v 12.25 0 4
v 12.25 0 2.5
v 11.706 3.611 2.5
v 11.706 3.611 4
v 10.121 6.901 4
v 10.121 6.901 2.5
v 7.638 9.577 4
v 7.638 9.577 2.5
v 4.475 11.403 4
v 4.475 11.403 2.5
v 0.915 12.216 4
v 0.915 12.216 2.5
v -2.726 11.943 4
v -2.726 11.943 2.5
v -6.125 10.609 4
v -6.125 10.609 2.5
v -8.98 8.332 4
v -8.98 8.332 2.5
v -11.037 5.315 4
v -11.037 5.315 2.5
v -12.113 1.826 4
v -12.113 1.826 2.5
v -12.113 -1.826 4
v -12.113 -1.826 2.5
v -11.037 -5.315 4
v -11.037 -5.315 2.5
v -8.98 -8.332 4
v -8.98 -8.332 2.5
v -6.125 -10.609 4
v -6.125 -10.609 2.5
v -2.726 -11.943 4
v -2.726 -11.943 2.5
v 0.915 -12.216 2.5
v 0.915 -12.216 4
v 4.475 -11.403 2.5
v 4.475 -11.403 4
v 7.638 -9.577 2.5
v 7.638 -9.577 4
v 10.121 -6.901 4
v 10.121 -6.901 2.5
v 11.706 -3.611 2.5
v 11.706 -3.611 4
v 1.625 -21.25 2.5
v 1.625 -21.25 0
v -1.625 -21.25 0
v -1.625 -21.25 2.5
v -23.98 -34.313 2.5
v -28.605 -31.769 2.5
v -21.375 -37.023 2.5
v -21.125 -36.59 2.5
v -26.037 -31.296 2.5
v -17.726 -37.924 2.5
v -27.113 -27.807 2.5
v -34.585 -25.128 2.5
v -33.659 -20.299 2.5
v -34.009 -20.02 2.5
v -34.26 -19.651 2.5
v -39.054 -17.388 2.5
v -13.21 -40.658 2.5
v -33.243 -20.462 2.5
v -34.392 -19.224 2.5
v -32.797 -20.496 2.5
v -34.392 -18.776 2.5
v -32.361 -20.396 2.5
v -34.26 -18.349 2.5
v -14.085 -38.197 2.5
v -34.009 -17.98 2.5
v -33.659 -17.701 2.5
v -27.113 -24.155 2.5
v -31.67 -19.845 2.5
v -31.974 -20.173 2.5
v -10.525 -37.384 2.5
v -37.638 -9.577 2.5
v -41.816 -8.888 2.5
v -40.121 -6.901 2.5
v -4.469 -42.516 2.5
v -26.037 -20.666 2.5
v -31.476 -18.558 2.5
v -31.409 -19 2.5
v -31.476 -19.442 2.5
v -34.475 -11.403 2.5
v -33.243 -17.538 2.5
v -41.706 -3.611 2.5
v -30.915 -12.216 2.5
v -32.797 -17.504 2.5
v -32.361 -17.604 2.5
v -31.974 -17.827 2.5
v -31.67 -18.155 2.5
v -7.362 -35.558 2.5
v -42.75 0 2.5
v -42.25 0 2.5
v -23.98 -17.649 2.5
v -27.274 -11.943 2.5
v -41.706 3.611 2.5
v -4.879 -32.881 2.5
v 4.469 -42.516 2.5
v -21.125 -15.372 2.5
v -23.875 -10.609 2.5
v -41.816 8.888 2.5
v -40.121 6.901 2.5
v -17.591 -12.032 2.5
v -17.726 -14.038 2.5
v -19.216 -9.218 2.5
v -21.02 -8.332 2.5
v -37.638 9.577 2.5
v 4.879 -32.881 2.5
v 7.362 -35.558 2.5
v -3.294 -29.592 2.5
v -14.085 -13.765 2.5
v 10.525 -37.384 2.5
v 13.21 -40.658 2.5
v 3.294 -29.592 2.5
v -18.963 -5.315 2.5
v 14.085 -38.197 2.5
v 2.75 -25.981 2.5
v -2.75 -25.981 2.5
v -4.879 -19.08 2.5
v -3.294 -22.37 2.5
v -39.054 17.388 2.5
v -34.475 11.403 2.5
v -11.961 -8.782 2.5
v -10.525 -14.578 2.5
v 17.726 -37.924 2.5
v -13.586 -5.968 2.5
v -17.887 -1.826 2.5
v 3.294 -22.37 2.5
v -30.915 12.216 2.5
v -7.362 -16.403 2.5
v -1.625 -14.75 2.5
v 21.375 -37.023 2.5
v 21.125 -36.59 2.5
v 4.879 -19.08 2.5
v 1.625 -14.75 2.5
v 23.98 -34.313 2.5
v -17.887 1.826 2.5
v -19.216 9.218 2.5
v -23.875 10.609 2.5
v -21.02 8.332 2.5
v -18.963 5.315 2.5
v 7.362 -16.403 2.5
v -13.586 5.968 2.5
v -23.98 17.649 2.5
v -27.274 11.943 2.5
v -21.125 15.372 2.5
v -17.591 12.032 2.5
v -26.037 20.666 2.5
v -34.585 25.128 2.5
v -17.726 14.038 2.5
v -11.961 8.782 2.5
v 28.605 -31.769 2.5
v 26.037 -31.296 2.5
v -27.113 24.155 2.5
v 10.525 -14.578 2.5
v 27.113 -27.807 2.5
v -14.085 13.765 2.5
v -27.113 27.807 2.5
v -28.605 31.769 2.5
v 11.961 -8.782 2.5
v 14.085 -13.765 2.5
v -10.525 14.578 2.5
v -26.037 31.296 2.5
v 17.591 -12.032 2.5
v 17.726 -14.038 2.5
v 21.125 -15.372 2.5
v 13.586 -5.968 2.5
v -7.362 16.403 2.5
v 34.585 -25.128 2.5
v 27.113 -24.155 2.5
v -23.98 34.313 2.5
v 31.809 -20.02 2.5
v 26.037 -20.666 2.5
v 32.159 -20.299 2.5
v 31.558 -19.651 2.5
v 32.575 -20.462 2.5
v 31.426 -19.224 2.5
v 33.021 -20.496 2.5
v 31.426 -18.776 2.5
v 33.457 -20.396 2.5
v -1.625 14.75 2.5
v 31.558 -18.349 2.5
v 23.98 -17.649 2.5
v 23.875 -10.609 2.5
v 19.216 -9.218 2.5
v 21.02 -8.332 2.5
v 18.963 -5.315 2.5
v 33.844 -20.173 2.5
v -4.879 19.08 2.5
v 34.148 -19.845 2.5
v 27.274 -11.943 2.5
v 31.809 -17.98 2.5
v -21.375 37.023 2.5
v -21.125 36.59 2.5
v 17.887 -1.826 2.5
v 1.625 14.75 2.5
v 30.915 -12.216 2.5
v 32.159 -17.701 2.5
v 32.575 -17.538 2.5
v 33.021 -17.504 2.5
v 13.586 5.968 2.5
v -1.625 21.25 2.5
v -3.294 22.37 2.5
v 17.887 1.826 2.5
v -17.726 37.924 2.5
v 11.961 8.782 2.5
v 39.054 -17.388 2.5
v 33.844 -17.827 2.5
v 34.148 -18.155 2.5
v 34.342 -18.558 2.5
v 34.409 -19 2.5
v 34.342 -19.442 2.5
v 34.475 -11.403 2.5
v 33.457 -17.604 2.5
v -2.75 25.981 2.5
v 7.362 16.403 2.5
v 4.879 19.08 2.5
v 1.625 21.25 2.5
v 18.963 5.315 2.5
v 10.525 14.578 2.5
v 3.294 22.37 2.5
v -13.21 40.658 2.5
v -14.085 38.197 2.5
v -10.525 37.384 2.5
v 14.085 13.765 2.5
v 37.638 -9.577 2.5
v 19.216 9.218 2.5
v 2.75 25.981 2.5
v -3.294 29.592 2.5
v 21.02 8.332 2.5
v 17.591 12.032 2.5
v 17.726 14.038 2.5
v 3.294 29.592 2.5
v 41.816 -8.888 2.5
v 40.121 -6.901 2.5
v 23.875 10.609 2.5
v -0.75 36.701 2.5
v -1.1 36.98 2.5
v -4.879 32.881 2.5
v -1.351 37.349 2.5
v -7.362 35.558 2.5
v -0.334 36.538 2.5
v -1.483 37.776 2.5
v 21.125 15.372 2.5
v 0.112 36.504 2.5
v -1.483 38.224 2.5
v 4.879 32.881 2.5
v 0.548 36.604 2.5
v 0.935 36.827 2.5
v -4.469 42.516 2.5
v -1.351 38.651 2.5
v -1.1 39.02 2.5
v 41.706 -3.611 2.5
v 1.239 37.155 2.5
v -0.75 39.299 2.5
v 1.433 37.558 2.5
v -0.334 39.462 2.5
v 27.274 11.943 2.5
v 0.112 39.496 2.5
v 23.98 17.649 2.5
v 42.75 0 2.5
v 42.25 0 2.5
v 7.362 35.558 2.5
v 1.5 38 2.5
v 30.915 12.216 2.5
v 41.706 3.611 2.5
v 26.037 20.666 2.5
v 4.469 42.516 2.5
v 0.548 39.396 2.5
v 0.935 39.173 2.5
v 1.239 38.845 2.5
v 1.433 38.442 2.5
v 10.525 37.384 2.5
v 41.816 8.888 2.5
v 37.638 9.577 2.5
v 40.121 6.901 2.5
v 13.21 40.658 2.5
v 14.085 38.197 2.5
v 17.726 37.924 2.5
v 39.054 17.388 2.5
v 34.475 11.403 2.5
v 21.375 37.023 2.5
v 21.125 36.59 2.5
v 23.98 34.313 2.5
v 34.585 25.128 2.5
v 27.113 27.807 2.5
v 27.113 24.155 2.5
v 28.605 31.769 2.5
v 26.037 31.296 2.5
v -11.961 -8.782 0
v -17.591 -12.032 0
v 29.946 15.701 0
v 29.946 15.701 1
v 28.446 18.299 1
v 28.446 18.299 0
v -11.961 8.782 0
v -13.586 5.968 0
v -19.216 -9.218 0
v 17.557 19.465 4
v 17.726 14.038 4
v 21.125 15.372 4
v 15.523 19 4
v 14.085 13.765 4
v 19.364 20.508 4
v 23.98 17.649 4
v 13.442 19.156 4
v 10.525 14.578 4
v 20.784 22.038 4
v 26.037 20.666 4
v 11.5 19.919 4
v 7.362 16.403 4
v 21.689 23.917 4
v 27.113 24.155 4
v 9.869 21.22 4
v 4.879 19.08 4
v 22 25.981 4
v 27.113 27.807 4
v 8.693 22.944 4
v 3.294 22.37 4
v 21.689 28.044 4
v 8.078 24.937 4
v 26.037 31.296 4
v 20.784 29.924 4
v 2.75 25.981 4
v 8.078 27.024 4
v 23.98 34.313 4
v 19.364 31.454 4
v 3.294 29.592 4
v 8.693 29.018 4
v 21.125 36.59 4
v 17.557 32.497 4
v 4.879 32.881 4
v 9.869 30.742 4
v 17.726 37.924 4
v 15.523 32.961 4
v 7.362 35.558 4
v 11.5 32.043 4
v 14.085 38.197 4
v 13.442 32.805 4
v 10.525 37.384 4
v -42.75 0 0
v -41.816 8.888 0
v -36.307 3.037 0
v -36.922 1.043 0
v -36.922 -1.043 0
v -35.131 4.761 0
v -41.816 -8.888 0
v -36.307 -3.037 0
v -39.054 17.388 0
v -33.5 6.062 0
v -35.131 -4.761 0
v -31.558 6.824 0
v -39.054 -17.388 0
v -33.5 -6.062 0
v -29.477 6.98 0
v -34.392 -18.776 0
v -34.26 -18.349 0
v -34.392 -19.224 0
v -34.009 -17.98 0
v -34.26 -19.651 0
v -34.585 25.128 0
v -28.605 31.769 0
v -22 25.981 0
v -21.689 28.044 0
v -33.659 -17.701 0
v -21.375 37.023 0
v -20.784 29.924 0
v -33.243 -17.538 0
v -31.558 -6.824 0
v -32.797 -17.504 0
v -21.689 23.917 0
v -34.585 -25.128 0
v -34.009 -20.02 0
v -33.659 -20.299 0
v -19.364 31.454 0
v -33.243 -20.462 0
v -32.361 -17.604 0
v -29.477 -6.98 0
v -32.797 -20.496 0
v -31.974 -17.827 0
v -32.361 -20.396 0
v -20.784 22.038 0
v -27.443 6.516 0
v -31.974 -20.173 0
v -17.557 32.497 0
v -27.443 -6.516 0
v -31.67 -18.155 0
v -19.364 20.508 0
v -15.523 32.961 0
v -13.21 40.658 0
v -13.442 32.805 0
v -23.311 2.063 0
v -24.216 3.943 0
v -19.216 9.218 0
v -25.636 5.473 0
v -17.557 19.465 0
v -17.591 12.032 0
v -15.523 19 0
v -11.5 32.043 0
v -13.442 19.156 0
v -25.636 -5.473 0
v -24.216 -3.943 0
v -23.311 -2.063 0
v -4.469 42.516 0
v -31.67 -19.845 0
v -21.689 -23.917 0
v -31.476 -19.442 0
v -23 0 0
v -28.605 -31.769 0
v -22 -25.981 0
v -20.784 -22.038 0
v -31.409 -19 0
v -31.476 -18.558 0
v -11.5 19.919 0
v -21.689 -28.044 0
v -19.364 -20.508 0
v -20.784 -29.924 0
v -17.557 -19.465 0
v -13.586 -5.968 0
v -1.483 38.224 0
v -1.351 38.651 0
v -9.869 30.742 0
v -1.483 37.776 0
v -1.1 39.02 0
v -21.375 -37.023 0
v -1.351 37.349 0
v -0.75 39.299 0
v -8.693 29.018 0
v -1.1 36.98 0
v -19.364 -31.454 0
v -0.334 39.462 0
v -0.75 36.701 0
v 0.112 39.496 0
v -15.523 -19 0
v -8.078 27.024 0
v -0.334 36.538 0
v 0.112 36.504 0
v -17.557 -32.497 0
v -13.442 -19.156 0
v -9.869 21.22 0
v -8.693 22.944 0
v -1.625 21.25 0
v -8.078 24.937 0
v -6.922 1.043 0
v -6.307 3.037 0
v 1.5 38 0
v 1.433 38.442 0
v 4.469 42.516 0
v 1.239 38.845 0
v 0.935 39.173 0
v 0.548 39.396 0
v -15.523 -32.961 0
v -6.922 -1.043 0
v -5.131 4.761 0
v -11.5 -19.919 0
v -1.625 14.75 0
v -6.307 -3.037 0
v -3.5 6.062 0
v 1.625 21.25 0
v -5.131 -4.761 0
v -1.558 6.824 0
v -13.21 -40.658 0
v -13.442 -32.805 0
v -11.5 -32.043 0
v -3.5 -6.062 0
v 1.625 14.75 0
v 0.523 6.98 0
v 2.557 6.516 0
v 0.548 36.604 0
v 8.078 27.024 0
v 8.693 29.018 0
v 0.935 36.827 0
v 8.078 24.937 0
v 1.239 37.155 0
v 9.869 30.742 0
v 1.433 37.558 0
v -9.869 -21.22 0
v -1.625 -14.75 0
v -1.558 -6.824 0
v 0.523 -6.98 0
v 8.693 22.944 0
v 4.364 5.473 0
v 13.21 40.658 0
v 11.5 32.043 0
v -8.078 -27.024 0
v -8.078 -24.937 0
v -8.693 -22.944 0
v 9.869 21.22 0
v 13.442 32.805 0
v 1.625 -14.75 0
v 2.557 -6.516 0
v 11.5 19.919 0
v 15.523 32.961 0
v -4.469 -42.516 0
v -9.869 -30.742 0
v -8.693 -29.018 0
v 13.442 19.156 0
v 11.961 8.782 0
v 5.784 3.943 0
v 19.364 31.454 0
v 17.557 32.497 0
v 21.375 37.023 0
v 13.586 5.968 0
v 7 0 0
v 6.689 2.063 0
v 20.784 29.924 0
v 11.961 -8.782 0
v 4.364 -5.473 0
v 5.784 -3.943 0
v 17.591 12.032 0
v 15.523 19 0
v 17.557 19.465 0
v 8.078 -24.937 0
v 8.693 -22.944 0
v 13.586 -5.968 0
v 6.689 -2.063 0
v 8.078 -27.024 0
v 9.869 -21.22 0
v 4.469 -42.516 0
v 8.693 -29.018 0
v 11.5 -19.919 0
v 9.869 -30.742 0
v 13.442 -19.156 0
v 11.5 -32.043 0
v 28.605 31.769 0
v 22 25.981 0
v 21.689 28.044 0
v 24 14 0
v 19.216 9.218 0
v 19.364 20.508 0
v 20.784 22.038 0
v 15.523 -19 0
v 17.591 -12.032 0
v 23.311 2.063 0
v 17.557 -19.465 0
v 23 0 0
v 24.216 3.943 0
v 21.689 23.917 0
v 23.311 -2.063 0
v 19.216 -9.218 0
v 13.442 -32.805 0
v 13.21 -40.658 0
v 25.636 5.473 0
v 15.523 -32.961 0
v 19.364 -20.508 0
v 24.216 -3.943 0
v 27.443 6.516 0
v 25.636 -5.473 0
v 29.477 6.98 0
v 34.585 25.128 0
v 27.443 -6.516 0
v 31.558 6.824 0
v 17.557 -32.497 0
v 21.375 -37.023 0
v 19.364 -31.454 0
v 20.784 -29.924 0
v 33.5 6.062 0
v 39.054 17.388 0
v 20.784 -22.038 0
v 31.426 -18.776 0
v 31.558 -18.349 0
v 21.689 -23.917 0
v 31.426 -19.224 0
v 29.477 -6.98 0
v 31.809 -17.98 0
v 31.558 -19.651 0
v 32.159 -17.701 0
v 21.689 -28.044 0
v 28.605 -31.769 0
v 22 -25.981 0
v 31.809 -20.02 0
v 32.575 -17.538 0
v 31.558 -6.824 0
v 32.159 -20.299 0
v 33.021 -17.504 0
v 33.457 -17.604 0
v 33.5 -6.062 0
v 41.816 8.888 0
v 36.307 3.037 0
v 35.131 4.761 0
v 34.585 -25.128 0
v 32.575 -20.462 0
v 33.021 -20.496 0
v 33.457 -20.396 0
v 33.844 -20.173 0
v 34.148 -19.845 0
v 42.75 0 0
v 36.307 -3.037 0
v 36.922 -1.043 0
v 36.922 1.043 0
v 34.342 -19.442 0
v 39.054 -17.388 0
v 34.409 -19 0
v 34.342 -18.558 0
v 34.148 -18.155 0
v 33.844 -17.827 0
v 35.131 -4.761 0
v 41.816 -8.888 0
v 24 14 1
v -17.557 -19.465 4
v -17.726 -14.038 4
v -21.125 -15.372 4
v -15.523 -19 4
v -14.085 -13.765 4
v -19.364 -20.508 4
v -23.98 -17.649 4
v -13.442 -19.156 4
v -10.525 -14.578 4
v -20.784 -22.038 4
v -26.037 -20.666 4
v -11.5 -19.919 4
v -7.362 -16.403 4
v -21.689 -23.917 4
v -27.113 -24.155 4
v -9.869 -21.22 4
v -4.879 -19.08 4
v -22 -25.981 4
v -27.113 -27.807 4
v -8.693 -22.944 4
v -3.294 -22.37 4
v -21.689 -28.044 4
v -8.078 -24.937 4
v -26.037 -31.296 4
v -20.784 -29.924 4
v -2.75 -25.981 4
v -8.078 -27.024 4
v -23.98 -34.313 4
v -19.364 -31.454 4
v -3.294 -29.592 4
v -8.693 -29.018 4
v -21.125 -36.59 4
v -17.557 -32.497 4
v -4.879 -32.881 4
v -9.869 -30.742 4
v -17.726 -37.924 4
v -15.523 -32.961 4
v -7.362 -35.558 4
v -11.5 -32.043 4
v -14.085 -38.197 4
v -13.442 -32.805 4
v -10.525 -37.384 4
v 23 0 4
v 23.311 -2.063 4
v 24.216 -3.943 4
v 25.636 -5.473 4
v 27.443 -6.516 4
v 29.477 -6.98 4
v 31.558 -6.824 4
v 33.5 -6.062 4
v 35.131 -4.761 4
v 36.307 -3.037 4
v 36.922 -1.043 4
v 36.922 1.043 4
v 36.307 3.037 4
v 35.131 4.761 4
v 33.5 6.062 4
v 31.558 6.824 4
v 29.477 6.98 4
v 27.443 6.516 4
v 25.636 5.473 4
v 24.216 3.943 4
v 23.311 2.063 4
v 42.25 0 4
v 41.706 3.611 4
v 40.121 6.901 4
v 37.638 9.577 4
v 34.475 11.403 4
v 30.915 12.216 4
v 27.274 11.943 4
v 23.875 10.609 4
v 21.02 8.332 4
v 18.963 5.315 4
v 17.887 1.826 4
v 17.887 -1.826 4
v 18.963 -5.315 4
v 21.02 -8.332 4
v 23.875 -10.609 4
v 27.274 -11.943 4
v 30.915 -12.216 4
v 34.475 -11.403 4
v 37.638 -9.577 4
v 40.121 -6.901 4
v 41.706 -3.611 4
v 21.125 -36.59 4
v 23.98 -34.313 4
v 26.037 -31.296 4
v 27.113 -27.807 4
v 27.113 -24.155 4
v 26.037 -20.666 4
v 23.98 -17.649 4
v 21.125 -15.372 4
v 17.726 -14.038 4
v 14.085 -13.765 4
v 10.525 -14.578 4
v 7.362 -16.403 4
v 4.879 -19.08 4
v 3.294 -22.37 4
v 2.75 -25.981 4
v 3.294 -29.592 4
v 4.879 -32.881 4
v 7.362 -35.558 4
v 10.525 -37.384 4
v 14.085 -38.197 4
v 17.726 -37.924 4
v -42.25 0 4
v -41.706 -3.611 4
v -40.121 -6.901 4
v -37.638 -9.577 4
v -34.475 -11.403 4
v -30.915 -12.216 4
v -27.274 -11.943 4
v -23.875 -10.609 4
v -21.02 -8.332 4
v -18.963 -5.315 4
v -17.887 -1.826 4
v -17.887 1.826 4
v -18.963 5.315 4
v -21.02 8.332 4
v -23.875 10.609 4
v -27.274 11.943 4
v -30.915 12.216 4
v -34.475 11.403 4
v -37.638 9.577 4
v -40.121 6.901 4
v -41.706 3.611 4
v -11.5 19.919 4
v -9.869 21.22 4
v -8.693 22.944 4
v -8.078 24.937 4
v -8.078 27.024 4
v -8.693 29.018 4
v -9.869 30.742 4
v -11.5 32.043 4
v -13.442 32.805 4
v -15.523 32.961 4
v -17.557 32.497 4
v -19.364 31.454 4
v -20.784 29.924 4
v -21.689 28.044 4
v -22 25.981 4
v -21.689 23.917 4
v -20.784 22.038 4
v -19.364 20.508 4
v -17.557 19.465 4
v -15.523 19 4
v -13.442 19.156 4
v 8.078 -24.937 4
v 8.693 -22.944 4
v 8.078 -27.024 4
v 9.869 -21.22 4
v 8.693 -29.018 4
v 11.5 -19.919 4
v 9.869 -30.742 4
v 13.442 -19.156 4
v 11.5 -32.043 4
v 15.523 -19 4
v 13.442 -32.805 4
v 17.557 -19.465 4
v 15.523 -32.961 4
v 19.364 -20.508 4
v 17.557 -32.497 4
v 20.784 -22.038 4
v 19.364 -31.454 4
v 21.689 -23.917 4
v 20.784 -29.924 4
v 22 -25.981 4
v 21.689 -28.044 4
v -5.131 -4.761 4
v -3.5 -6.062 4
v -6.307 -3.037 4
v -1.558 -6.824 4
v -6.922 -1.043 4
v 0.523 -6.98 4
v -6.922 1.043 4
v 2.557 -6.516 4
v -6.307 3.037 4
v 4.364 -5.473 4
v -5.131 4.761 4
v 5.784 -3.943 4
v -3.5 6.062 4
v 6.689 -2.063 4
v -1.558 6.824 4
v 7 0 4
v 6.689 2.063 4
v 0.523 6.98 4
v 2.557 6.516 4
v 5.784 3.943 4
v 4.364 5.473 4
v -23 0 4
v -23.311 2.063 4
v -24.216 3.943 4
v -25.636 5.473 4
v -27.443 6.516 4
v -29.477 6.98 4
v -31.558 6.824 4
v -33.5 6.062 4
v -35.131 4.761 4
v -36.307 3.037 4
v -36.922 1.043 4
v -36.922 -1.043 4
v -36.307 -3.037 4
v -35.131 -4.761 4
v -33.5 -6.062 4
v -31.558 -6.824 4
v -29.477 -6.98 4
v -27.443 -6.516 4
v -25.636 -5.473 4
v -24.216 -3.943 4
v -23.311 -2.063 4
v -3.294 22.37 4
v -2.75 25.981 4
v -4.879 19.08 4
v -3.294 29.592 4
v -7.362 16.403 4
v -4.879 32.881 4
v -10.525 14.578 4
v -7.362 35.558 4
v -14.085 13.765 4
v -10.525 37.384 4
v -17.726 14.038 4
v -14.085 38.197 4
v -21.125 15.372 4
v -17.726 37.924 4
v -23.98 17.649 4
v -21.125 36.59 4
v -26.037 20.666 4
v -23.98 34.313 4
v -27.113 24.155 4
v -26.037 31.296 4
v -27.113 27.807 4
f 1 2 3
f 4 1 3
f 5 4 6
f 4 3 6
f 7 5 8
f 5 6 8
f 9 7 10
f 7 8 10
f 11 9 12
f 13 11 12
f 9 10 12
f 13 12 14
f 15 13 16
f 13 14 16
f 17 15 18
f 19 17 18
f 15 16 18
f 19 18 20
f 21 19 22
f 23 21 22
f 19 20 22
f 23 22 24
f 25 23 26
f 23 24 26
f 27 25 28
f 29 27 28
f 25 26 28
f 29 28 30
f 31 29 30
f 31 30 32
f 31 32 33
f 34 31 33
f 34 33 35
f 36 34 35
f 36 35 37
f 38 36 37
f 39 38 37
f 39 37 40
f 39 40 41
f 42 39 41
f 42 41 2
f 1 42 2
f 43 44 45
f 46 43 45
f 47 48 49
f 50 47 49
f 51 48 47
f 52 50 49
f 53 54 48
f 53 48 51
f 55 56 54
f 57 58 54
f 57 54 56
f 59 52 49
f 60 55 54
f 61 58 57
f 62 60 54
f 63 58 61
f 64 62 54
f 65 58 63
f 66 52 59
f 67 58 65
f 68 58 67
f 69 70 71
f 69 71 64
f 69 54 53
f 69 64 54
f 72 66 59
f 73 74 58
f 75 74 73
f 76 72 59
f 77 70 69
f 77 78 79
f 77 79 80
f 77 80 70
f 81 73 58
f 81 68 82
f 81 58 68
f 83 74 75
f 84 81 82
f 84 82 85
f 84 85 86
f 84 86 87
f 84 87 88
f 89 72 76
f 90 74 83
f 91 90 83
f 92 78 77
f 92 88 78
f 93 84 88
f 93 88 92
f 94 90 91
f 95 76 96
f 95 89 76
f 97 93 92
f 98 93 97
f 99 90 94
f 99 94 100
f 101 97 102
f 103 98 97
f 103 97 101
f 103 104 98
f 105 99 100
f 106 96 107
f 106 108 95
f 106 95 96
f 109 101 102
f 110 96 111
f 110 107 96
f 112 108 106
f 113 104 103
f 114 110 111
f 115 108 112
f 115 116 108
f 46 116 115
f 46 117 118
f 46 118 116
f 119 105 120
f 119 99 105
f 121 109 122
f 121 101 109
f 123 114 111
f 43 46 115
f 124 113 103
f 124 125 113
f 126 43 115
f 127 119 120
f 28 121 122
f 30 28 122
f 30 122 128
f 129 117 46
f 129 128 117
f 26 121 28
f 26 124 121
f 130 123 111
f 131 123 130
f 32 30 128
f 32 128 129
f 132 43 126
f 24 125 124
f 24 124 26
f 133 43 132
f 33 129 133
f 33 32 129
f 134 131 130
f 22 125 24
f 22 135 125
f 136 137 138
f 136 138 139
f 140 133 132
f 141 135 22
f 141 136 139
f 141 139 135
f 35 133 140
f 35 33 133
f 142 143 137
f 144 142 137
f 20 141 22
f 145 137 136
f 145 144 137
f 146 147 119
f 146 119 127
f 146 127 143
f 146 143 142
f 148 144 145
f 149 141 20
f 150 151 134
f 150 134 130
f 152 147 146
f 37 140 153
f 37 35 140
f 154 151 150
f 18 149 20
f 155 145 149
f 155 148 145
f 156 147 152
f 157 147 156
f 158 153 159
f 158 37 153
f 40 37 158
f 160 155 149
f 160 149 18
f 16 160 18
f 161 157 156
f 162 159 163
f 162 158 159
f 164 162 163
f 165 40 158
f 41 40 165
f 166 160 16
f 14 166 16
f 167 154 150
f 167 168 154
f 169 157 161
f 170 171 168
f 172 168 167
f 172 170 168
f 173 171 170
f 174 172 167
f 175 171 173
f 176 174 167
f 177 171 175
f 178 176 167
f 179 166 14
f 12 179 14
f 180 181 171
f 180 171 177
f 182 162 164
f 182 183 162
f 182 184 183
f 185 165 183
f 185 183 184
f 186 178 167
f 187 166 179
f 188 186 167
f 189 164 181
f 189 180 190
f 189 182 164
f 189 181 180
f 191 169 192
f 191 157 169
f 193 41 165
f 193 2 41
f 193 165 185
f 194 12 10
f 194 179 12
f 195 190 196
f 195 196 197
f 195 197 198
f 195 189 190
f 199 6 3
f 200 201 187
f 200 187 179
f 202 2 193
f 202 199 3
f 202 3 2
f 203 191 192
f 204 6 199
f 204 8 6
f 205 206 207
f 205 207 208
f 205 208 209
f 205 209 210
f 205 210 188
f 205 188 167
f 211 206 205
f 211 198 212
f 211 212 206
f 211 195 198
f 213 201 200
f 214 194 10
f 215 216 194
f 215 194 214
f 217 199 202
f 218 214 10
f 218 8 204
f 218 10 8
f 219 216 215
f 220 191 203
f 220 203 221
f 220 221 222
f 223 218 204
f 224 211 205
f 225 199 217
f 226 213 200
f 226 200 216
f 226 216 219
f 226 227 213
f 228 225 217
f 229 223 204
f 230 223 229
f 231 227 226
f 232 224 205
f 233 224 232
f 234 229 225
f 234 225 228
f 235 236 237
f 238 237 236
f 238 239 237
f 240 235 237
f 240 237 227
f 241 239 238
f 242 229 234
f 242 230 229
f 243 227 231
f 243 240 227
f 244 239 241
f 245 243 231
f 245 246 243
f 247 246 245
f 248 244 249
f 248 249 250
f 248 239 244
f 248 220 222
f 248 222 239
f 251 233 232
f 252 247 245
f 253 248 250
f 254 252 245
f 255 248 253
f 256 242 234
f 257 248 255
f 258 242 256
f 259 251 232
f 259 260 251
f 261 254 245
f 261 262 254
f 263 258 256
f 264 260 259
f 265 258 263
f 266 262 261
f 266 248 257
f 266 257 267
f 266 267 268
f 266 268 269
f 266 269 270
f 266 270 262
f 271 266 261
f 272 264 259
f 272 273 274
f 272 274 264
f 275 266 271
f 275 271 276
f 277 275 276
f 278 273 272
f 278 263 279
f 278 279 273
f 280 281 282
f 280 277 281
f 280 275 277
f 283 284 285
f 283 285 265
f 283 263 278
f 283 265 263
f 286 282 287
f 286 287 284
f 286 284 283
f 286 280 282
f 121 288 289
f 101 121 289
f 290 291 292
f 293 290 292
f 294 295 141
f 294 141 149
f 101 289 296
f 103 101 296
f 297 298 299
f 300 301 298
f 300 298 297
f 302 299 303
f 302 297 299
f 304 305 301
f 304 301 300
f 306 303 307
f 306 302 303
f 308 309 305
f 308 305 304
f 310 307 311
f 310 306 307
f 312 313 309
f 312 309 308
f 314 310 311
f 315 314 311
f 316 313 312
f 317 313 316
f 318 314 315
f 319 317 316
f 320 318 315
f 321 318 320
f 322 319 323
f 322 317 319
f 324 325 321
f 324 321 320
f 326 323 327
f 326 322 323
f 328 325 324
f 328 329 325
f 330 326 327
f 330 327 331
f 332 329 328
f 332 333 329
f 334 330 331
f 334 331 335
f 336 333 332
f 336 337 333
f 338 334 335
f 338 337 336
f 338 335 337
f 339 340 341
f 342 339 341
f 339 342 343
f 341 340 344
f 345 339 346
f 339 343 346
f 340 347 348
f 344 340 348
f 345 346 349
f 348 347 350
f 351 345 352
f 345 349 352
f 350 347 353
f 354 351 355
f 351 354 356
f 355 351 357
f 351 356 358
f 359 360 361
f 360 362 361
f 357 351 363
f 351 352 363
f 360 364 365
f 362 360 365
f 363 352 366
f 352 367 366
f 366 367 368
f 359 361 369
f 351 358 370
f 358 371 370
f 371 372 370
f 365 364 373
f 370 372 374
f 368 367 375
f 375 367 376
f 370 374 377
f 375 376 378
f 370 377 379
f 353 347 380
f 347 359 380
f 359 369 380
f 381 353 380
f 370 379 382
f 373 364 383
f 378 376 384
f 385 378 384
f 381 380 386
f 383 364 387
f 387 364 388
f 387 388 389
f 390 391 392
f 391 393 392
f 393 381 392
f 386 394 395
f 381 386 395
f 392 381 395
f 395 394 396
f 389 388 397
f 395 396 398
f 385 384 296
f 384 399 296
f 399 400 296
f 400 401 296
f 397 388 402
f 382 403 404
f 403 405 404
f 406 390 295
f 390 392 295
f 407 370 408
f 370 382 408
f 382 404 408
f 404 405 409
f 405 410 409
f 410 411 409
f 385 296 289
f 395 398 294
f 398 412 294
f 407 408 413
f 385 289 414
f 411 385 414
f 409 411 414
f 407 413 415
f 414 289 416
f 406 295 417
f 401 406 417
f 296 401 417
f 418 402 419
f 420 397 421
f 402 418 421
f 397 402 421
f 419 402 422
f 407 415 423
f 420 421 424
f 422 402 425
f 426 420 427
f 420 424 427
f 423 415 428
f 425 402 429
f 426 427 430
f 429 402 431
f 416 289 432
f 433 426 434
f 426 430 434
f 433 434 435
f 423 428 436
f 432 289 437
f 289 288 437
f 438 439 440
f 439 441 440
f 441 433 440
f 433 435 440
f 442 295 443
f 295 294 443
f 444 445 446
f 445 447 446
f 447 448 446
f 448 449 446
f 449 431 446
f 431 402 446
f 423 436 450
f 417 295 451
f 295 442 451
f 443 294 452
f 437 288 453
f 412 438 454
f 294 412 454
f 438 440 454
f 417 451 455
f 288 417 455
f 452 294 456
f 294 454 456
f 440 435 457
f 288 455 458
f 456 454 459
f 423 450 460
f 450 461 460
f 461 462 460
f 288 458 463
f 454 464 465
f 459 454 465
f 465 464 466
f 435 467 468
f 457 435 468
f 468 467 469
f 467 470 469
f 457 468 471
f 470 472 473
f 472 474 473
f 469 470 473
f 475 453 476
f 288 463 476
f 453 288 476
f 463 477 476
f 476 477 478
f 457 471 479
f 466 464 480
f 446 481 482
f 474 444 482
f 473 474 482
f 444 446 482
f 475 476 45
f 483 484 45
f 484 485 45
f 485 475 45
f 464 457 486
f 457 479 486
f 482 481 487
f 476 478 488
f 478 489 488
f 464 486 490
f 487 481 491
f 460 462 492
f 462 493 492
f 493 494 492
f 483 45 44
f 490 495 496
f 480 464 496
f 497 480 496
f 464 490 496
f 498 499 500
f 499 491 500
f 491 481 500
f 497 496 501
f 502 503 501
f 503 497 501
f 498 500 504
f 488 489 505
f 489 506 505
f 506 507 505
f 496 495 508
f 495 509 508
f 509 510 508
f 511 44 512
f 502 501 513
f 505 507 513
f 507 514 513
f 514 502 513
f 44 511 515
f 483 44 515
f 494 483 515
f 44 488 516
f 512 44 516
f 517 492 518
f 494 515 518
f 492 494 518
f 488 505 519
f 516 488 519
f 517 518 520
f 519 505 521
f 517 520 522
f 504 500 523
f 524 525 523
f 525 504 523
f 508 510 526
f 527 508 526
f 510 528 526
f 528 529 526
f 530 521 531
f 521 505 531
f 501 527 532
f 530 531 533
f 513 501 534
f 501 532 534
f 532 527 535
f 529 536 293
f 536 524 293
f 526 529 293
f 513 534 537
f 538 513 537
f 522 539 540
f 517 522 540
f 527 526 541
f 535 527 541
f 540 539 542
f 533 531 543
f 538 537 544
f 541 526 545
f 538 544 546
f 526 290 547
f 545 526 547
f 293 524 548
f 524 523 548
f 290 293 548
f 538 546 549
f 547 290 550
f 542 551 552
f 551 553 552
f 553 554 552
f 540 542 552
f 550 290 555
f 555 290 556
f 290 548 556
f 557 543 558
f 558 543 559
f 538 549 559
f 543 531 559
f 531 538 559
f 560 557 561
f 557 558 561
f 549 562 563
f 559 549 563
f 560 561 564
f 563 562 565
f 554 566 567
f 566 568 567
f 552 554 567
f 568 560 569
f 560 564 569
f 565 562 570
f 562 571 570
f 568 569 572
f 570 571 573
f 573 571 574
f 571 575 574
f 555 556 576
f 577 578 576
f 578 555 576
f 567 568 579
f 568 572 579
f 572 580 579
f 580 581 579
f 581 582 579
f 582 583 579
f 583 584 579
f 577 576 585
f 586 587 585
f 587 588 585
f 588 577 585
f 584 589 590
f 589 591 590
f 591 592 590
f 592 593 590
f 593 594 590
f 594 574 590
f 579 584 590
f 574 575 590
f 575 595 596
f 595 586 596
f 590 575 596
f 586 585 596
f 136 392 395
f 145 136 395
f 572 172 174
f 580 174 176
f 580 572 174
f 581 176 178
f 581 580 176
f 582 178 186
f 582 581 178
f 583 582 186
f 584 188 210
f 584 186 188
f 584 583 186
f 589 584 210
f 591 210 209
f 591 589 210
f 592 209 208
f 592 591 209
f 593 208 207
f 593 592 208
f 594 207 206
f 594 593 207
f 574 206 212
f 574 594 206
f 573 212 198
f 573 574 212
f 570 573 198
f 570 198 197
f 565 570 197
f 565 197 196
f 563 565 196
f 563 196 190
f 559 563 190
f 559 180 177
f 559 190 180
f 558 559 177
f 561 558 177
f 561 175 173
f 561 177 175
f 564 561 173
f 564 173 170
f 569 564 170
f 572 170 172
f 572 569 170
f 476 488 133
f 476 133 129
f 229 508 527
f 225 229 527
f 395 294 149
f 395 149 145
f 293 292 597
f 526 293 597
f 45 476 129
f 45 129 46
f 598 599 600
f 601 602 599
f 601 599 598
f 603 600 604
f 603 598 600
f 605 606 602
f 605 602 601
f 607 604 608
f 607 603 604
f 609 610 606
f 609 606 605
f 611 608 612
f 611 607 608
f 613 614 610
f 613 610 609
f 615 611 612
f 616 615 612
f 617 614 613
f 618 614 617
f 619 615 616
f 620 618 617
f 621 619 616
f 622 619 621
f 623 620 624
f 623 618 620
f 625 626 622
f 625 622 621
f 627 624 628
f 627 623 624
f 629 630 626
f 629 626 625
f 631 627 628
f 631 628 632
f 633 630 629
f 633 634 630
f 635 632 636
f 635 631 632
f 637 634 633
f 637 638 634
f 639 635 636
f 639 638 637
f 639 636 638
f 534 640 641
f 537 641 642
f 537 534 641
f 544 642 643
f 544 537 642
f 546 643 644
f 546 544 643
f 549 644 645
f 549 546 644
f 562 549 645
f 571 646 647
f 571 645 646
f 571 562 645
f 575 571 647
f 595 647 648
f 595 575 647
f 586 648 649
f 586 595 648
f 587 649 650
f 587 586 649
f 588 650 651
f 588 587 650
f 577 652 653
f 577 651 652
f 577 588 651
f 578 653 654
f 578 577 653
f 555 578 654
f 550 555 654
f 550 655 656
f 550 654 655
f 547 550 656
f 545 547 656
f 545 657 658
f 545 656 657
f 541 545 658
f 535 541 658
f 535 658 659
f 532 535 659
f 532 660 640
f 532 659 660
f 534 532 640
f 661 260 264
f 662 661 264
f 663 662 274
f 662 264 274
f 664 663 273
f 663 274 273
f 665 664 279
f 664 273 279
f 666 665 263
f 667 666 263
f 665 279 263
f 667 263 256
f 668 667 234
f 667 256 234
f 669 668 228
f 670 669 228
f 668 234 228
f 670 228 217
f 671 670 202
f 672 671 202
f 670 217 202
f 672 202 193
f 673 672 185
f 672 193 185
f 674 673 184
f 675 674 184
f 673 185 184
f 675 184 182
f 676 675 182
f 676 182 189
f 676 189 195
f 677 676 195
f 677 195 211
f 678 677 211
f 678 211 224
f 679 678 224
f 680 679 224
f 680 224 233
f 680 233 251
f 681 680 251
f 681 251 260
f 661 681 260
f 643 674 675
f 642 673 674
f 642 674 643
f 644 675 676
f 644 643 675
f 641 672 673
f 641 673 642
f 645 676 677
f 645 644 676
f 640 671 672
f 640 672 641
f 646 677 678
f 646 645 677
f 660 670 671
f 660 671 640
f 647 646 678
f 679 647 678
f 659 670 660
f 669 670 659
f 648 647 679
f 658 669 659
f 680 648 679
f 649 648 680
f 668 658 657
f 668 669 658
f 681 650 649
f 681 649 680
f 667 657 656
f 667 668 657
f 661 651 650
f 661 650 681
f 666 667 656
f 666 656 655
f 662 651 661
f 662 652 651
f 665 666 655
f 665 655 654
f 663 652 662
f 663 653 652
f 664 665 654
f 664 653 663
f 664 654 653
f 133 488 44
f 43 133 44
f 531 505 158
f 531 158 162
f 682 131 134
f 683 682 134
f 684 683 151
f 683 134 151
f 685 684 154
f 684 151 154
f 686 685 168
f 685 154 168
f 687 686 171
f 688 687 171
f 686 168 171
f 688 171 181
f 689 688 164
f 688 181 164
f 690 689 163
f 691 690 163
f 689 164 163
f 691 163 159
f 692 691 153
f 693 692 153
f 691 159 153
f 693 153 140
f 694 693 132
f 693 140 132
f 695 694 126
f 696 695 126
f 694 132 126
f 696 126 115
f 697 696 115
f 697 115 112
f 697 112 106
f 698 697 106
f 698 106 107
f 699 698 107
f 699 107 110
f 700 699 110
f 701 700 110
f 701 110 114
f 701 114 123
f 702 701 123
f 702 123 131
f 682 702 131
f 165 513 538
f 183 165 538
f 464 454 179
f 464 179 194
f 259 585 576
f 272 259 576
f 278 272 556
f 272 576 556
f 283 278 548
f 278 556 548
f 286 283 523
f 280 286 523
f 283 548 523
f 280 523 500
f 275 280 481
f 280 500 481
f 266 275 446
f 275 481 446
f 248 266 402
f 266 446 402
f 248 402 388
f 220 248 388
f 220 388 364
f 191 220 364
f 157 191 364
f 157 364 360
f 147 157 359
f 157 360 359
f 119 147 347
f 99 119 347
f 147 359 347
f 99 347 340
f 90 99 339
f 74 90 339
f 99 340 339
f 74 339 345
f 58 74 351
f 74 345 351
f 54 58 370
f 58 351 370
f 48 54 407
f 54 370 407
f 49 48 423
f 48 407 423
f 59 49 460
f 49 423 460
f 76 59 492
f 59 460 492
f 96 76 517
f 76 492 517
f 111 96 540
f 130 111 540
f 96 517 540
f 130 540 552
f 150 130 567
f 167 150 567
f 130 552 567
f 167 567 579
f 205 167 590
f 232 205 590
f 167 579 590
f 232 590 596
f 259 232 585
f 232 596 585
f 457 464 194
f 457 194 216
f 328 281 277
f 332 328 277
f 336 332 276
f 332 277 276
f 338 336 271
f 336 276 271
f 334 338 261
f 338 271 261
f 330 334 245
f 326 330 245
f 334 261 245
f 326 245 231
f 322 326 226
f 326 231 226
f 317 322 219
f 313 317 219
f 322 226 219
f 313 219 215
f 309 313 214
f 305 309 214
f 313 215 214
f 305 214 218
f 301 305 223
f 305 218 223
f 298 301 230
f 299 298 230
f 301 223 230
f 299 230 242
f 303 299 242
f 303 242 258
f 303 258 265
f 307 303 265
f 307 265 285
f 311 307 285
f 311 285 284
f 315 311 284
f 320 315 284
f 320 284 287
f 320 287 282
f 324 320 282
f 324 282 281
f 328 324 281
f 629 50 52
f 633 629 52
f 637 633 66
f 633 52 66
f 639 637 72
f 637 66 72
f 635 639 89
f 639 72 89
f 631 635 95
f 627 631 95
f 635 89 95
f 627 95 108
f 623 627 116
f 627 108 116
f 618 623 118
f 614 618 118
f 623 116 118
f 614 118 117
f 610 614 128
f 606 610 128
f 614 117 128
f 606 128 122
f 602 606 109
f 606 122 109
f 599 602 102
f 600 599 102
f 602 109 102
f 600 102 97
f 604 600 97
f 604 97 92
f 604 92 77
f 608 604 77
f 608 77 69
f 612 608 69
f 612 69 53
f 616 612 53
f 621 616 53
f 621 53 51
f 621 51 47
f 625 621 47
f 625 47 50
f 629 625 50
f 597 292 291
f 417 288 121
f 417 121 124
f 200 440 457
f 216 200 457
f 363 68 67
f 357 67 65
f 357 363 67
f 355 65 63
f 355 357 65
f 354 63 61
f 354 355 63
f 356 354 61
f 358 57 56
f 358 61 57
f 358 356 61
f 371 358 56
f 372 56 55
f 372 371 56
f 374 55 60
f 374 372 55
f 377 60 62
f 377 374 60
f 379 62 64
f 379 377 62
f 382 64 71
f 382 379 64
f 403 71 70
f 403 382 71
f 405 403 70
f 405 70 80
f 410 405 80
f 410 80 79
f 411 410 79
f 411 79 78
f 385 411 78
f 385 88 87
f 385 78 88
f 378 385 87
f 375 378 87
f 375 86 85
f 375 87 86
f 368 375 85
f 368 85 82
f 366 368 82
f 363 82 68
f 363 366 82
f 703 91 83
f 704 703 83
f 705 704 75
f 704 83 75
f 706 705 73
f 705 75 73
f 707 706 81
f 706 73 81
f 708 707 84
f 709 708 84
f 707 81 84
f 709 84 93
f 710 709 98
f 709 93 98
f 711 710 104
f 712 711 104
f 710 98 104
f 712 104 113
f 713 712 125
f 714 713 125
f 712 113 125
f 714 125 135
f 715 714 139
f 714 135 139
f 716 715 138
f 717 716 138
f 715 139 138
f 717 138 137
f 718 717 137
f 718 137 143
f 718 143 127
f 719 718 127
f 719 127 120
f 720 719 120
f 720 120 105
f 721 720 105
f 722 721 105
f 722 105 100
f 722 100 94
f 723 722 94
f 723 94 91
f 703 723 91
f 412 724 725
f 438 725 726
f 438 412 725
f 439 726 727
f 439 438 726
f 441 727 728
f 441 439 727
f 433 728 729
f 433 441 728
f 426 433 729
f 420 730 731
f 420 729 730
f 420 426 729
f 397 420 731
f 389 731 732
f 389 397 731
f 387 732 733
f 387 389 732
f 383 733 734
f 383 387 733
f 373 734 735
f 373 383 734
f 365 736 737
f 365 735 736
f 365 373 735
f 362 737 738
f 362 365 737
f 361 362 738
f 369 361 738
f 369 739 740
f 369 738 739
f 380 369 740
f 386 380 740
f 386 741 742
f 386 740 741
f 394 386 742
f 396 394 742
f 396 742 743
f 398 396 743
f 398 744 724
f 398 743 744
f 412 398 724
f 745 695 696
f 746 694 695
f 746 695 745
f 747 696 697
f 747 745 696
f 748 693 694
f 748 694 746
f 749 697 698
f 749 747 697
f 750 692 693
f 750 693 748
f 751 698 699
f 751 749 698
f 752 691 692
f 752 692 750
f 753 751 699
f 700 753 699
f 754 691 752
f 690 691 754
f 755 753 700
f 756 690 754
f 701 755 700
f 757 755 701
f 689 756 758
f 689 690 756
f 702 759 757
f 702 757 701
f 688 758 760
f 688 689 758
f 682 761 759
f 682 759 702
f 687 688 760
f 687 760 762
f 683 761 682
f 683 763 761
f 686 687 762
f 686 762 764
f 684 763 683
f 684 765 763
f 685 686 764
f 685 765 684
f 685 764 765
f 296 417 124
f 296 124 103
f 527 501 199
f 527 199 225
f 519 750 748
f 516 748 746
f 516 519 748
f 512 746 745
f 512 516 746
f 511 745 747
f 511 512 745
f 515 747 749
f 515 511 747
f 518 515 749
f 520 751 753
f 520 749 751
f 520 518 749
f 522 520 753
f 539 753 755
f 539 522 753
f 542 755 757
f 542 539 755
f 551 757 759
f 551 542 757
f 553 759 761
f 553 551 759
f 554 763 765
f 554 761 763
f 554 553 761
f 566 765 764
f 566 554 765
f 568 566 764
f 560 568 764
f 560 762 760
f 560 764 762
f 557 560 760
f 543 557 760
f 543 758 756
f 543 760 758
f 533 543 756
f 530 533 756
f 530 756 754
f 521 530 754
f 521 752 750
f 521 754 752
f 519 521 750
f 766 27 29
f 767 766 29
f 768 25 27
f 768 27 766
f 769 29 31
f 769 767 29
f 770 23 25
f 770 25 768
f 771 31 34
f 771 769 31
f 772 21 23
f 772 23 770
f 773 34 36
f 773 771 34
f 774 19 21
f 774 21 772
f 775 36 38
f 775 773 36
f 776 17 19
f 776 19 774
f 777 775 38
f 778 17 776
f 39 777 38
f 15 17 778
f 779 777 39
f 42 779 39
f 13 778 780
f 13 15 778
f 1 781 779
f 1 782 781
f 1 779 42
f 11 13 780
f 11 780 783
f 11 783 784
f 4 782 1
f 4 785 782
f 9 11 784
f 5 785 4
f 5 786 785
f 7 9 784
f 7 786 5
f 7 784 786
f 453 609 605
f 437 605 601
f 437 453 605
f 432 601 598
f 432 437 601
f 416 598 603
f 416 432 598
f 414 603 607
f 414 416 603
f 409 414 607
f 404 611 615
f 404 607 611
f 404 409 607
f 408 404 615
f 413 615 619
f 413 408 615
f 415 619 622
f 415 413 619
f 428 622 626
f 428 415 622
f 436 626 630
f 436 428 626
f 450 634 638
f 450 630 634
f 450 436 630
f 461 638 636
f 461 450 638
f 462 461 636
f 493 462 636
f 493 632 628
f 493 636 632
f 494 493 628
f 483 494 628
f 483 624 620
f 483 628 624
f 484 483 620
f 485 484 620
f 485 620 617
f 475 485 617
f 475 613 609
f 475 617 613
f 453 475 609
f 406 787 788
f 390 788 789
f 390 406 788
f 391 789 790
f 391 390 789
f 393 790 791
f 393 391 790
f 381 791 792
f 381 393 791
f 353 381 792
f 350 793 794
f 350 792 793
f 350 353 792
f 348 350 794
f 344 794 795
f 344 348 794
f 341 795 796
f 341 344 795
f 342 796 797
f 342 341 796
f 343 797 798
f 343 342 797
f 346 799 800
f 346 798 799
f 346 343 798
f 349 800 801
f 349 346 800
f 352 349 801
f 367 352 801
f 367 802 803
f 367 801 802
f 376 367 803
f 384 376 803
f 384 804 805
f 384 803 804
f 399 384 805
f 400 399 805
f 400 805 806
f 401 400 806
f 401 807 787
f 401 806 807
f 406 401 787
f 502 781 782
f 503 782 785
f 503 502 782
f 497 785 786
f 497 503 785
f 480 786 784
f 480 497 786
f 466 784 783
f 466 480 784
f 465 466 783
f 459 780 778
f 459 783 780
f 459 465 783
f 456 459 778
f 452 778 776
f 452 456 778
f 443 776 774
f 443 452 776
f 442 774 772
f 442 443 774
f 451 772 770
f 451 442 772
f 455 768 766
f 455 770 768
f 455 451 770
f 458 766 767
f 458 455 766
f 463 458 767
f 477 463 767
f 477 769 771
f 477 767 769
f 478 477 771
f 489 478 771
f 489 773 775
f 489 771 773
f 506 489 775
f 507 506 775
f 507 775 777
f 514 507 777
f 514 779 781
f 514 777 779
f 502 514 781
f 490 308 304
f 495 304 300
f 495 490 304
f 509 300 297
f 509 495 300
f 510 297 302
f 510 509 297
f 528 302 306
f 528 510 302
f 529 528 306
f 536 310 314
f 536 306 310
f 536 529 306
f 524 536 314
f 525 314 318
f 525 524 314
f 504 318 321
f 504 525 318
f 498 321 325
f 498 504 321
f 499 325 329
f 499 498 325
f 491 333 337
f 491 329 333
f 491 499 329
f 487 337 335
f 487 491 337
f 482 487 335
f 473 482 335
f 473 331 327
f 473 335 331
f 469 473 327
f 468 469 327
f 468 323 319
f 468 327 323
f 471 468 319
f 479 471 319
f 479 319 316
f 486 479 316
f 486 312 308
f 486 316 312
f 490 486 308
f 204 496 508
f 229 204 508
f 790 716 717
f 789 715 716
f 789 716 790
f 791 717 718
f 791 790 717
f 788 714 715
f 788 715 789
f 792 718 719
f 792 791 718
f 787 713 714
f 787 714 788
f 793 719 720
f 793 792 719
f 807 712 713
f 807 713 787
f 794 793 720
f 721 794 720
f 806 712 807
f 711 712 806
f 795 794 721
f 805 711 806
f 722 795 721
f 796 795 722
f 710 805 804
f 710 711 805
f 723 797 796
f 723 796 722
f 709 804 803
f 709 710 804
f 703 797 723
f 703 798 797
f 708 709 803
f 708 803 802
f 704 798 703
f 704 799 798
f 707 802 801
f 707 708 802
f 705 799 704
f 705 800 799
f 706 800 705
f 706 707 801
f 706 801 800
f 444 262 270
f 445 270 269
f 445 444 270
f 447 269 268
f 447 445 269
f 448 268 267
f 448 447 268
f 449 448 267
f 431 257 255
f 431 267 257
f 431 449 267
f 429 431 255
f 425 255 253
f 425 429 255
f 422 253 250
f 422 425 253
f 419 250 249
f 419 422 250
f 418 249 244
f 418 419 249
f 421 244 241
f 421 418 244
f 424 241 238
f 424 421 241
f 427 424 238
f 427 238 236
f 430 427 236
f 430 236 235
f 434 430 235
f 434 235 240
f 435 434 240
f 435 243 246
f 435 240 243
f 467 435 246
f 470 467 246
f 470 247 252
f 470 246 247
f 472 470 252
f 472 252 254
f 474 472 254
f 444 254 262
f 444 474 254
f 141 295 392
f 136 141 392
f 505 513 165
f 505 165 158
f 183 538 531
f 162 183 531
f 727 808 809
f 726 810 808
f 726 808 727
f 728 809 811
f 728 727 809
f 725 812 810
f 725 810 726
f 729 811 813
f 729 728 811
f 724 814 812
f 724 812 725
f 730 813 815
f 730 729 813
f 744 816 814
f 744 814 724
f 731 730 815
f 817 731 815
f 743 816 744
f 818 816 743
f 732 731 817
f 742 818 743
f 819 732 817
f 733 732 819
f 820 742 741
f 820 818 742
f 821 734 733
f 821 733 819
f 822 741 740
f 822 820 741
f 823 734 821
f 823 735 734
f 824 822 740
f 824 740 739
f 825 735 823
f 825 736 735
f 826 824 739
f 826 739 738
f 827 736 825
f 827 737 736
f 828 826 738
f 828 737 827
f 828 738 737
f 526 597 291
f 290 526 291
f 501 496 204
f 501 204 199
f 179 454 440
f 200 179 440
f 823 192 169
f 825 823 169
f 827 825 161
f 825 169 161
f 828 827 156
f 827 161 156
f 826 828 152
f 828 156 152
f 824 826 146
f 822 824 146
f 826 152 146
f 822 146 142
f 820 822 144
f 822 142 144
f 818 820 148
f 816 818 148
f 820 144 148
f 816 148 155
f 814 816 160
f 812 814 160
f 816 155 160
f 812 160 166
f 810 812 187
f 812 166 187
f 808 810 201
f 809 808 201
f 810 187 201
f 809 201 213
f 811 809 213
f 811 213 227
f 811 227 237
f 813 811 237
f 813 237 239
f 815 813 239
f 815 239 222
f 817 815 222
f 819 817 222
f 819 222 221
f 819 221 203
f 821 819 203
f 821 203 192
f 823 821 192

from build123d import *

# Parameters (mm, degrees)
CYLINDER_R            = 42.75
CYLINDER_DEPTH        = 2.5
CYLINDER001_R         = 12.25
CYLINDER001_DEPTH     = 4
CYLINDER002_R         = 12.25
CYLINDER002_DEPTH     = 4
POLARPATTERN_COUNT    = 6
SKETCH_R              = 7
POCKET_DEPTH          = 4.001
SKETCH001_R           = 7
POCKET001_DEPTH       = 245.963807
POLARPATTERN001_COUNT = 6
SKETCH002_R           = 1.5
POCKET002_DEPTH       = 245.963807
POLARPATTERN002_COUNT = 3
SKETCH003_W           = 3.25
SKETCH003_H           = 6.5
POCKET003_DEPTH       = 245.963807
POLARPATTERN003_COUNT = 6
POCKET004_DEPTH       = 1


with BuildPart() as part:
    # Cylinder → Cylinder (join)
    with BuildSketch(Plane.XY):
        Circle(CYLINDER_R)
    extrude(amount=CYLINDER_DEPTH)

    # Cylinder001 → Cylinder001 (join)
    with BuildSketch(Plane.XY):
        Circle(CYLINDER001_R)
    extrude(amount=CYLINDER001_DEPTH)

    # Cylinder002 → Cylinder002 (join)
    with BuildSketch(Plane(origin=(30, 0, 0), x_dir=(1, 0, 0), z_dir=(0, 0, 1))):
        Circle(CYLINDER002_R)
    cylinder002 = extrude(amount=CYLINDER002_DEPTH)

    # PolarPattern: Cylinder002 ×6 about axis
    polarpattern_axis = Axis((0, 0, 0), (0, 0, 1))
    for i in range(1, POLARPATTERN_COUNT):
        add(cylinder002.rotate(polarpattern_axis, i * 360 / POLARPATTERN_COUNT))

    # Sketch → Pocket (cut, through all)
    with BuildSketch(Plane.XY):
        Circle(SKETCH_R)
    extrude(amount=POCKET_DEPTH, mode=Mode.SUBTRACT)

    # Sketch001 → Pocket001 (cut, through all)
    with BuildSketch(Plane.XY):
        with Locations((-30, 0)):
            Circle(SKETCH001_R)
    pocket001 = extrude(amount=POCKET001_DEPTH, mode=Mode.SUBTRACT)

    # PolarPattern001: Pocket001 ×6 about axis
    polarpattern001_axis = Axis((0, 0, 0), (0, 0, 1))
    for i in range(1, POLARPATTERN001_COUNT):
        add(pocket001.rotate(polarpattern001_axis, i * 360 / POLARPATTERN001_COUNT), mode=Mode.SUBTRACT)

    # Sketch002 → Pocket002 (cut, through all)
    with BuildSketch(Plane.XY):
        with Locations((0, 38)):
            Circle(SKETCH002_R)
    pocket002 = extrude(amount=POCKET002_DEPTH, mode=Mode.SUBTRACT)

    # PolarPattern002: Pocket002 ×3 about axis
    polarpattern002_axis = Axis((0, 0, 0), (0, 0, 1))
    for i in range(1, POLARPATTERN002_COUNT):
        add(pocket002.rotate(polarpattern002_axis, i * 360 / POLARPATTERN002_COUNT), mode=Mode.SUBTRACT)

    # Sketch003 → Pocket003 (cut, through all)
    with BuildSketch(Plane.XY):
        with Locations((0, 18)):
            Rectangle(SKETCH003_W, SKETCH003_H)
    pocket003 = extrude(amount=POCKET003_DEPTH, mode=Mode.SUBTRACT)

    # PolarPattern003: Pocket003 ×6 about axis
    polarpattern003_axis = Axis((0, 0, 0), (0, 0, 1))
    for i in range(1, POLARPATTERN003_COUNT):
        add(pocket003.rotate(polarpattern003_axis, i * 360 / POLARPATTERN003_COUNT), mode=Mode.SUBTRACT)

    # Sketch004 → Pocket004 (cut, symmetric)
    with BuildSketch(Plane(origin=(24, 14, 0), x_dir=(0.5, -0.866025, 0), z_dir=(0, 0, 1))):
        Polygon((0, 0), (1.5, 6), (-1.5, 6), align=None)
    extrude(amount=POCKET004_DEPTH, both=True, mode=Mode.SUBTRACT)


solid = part.part
